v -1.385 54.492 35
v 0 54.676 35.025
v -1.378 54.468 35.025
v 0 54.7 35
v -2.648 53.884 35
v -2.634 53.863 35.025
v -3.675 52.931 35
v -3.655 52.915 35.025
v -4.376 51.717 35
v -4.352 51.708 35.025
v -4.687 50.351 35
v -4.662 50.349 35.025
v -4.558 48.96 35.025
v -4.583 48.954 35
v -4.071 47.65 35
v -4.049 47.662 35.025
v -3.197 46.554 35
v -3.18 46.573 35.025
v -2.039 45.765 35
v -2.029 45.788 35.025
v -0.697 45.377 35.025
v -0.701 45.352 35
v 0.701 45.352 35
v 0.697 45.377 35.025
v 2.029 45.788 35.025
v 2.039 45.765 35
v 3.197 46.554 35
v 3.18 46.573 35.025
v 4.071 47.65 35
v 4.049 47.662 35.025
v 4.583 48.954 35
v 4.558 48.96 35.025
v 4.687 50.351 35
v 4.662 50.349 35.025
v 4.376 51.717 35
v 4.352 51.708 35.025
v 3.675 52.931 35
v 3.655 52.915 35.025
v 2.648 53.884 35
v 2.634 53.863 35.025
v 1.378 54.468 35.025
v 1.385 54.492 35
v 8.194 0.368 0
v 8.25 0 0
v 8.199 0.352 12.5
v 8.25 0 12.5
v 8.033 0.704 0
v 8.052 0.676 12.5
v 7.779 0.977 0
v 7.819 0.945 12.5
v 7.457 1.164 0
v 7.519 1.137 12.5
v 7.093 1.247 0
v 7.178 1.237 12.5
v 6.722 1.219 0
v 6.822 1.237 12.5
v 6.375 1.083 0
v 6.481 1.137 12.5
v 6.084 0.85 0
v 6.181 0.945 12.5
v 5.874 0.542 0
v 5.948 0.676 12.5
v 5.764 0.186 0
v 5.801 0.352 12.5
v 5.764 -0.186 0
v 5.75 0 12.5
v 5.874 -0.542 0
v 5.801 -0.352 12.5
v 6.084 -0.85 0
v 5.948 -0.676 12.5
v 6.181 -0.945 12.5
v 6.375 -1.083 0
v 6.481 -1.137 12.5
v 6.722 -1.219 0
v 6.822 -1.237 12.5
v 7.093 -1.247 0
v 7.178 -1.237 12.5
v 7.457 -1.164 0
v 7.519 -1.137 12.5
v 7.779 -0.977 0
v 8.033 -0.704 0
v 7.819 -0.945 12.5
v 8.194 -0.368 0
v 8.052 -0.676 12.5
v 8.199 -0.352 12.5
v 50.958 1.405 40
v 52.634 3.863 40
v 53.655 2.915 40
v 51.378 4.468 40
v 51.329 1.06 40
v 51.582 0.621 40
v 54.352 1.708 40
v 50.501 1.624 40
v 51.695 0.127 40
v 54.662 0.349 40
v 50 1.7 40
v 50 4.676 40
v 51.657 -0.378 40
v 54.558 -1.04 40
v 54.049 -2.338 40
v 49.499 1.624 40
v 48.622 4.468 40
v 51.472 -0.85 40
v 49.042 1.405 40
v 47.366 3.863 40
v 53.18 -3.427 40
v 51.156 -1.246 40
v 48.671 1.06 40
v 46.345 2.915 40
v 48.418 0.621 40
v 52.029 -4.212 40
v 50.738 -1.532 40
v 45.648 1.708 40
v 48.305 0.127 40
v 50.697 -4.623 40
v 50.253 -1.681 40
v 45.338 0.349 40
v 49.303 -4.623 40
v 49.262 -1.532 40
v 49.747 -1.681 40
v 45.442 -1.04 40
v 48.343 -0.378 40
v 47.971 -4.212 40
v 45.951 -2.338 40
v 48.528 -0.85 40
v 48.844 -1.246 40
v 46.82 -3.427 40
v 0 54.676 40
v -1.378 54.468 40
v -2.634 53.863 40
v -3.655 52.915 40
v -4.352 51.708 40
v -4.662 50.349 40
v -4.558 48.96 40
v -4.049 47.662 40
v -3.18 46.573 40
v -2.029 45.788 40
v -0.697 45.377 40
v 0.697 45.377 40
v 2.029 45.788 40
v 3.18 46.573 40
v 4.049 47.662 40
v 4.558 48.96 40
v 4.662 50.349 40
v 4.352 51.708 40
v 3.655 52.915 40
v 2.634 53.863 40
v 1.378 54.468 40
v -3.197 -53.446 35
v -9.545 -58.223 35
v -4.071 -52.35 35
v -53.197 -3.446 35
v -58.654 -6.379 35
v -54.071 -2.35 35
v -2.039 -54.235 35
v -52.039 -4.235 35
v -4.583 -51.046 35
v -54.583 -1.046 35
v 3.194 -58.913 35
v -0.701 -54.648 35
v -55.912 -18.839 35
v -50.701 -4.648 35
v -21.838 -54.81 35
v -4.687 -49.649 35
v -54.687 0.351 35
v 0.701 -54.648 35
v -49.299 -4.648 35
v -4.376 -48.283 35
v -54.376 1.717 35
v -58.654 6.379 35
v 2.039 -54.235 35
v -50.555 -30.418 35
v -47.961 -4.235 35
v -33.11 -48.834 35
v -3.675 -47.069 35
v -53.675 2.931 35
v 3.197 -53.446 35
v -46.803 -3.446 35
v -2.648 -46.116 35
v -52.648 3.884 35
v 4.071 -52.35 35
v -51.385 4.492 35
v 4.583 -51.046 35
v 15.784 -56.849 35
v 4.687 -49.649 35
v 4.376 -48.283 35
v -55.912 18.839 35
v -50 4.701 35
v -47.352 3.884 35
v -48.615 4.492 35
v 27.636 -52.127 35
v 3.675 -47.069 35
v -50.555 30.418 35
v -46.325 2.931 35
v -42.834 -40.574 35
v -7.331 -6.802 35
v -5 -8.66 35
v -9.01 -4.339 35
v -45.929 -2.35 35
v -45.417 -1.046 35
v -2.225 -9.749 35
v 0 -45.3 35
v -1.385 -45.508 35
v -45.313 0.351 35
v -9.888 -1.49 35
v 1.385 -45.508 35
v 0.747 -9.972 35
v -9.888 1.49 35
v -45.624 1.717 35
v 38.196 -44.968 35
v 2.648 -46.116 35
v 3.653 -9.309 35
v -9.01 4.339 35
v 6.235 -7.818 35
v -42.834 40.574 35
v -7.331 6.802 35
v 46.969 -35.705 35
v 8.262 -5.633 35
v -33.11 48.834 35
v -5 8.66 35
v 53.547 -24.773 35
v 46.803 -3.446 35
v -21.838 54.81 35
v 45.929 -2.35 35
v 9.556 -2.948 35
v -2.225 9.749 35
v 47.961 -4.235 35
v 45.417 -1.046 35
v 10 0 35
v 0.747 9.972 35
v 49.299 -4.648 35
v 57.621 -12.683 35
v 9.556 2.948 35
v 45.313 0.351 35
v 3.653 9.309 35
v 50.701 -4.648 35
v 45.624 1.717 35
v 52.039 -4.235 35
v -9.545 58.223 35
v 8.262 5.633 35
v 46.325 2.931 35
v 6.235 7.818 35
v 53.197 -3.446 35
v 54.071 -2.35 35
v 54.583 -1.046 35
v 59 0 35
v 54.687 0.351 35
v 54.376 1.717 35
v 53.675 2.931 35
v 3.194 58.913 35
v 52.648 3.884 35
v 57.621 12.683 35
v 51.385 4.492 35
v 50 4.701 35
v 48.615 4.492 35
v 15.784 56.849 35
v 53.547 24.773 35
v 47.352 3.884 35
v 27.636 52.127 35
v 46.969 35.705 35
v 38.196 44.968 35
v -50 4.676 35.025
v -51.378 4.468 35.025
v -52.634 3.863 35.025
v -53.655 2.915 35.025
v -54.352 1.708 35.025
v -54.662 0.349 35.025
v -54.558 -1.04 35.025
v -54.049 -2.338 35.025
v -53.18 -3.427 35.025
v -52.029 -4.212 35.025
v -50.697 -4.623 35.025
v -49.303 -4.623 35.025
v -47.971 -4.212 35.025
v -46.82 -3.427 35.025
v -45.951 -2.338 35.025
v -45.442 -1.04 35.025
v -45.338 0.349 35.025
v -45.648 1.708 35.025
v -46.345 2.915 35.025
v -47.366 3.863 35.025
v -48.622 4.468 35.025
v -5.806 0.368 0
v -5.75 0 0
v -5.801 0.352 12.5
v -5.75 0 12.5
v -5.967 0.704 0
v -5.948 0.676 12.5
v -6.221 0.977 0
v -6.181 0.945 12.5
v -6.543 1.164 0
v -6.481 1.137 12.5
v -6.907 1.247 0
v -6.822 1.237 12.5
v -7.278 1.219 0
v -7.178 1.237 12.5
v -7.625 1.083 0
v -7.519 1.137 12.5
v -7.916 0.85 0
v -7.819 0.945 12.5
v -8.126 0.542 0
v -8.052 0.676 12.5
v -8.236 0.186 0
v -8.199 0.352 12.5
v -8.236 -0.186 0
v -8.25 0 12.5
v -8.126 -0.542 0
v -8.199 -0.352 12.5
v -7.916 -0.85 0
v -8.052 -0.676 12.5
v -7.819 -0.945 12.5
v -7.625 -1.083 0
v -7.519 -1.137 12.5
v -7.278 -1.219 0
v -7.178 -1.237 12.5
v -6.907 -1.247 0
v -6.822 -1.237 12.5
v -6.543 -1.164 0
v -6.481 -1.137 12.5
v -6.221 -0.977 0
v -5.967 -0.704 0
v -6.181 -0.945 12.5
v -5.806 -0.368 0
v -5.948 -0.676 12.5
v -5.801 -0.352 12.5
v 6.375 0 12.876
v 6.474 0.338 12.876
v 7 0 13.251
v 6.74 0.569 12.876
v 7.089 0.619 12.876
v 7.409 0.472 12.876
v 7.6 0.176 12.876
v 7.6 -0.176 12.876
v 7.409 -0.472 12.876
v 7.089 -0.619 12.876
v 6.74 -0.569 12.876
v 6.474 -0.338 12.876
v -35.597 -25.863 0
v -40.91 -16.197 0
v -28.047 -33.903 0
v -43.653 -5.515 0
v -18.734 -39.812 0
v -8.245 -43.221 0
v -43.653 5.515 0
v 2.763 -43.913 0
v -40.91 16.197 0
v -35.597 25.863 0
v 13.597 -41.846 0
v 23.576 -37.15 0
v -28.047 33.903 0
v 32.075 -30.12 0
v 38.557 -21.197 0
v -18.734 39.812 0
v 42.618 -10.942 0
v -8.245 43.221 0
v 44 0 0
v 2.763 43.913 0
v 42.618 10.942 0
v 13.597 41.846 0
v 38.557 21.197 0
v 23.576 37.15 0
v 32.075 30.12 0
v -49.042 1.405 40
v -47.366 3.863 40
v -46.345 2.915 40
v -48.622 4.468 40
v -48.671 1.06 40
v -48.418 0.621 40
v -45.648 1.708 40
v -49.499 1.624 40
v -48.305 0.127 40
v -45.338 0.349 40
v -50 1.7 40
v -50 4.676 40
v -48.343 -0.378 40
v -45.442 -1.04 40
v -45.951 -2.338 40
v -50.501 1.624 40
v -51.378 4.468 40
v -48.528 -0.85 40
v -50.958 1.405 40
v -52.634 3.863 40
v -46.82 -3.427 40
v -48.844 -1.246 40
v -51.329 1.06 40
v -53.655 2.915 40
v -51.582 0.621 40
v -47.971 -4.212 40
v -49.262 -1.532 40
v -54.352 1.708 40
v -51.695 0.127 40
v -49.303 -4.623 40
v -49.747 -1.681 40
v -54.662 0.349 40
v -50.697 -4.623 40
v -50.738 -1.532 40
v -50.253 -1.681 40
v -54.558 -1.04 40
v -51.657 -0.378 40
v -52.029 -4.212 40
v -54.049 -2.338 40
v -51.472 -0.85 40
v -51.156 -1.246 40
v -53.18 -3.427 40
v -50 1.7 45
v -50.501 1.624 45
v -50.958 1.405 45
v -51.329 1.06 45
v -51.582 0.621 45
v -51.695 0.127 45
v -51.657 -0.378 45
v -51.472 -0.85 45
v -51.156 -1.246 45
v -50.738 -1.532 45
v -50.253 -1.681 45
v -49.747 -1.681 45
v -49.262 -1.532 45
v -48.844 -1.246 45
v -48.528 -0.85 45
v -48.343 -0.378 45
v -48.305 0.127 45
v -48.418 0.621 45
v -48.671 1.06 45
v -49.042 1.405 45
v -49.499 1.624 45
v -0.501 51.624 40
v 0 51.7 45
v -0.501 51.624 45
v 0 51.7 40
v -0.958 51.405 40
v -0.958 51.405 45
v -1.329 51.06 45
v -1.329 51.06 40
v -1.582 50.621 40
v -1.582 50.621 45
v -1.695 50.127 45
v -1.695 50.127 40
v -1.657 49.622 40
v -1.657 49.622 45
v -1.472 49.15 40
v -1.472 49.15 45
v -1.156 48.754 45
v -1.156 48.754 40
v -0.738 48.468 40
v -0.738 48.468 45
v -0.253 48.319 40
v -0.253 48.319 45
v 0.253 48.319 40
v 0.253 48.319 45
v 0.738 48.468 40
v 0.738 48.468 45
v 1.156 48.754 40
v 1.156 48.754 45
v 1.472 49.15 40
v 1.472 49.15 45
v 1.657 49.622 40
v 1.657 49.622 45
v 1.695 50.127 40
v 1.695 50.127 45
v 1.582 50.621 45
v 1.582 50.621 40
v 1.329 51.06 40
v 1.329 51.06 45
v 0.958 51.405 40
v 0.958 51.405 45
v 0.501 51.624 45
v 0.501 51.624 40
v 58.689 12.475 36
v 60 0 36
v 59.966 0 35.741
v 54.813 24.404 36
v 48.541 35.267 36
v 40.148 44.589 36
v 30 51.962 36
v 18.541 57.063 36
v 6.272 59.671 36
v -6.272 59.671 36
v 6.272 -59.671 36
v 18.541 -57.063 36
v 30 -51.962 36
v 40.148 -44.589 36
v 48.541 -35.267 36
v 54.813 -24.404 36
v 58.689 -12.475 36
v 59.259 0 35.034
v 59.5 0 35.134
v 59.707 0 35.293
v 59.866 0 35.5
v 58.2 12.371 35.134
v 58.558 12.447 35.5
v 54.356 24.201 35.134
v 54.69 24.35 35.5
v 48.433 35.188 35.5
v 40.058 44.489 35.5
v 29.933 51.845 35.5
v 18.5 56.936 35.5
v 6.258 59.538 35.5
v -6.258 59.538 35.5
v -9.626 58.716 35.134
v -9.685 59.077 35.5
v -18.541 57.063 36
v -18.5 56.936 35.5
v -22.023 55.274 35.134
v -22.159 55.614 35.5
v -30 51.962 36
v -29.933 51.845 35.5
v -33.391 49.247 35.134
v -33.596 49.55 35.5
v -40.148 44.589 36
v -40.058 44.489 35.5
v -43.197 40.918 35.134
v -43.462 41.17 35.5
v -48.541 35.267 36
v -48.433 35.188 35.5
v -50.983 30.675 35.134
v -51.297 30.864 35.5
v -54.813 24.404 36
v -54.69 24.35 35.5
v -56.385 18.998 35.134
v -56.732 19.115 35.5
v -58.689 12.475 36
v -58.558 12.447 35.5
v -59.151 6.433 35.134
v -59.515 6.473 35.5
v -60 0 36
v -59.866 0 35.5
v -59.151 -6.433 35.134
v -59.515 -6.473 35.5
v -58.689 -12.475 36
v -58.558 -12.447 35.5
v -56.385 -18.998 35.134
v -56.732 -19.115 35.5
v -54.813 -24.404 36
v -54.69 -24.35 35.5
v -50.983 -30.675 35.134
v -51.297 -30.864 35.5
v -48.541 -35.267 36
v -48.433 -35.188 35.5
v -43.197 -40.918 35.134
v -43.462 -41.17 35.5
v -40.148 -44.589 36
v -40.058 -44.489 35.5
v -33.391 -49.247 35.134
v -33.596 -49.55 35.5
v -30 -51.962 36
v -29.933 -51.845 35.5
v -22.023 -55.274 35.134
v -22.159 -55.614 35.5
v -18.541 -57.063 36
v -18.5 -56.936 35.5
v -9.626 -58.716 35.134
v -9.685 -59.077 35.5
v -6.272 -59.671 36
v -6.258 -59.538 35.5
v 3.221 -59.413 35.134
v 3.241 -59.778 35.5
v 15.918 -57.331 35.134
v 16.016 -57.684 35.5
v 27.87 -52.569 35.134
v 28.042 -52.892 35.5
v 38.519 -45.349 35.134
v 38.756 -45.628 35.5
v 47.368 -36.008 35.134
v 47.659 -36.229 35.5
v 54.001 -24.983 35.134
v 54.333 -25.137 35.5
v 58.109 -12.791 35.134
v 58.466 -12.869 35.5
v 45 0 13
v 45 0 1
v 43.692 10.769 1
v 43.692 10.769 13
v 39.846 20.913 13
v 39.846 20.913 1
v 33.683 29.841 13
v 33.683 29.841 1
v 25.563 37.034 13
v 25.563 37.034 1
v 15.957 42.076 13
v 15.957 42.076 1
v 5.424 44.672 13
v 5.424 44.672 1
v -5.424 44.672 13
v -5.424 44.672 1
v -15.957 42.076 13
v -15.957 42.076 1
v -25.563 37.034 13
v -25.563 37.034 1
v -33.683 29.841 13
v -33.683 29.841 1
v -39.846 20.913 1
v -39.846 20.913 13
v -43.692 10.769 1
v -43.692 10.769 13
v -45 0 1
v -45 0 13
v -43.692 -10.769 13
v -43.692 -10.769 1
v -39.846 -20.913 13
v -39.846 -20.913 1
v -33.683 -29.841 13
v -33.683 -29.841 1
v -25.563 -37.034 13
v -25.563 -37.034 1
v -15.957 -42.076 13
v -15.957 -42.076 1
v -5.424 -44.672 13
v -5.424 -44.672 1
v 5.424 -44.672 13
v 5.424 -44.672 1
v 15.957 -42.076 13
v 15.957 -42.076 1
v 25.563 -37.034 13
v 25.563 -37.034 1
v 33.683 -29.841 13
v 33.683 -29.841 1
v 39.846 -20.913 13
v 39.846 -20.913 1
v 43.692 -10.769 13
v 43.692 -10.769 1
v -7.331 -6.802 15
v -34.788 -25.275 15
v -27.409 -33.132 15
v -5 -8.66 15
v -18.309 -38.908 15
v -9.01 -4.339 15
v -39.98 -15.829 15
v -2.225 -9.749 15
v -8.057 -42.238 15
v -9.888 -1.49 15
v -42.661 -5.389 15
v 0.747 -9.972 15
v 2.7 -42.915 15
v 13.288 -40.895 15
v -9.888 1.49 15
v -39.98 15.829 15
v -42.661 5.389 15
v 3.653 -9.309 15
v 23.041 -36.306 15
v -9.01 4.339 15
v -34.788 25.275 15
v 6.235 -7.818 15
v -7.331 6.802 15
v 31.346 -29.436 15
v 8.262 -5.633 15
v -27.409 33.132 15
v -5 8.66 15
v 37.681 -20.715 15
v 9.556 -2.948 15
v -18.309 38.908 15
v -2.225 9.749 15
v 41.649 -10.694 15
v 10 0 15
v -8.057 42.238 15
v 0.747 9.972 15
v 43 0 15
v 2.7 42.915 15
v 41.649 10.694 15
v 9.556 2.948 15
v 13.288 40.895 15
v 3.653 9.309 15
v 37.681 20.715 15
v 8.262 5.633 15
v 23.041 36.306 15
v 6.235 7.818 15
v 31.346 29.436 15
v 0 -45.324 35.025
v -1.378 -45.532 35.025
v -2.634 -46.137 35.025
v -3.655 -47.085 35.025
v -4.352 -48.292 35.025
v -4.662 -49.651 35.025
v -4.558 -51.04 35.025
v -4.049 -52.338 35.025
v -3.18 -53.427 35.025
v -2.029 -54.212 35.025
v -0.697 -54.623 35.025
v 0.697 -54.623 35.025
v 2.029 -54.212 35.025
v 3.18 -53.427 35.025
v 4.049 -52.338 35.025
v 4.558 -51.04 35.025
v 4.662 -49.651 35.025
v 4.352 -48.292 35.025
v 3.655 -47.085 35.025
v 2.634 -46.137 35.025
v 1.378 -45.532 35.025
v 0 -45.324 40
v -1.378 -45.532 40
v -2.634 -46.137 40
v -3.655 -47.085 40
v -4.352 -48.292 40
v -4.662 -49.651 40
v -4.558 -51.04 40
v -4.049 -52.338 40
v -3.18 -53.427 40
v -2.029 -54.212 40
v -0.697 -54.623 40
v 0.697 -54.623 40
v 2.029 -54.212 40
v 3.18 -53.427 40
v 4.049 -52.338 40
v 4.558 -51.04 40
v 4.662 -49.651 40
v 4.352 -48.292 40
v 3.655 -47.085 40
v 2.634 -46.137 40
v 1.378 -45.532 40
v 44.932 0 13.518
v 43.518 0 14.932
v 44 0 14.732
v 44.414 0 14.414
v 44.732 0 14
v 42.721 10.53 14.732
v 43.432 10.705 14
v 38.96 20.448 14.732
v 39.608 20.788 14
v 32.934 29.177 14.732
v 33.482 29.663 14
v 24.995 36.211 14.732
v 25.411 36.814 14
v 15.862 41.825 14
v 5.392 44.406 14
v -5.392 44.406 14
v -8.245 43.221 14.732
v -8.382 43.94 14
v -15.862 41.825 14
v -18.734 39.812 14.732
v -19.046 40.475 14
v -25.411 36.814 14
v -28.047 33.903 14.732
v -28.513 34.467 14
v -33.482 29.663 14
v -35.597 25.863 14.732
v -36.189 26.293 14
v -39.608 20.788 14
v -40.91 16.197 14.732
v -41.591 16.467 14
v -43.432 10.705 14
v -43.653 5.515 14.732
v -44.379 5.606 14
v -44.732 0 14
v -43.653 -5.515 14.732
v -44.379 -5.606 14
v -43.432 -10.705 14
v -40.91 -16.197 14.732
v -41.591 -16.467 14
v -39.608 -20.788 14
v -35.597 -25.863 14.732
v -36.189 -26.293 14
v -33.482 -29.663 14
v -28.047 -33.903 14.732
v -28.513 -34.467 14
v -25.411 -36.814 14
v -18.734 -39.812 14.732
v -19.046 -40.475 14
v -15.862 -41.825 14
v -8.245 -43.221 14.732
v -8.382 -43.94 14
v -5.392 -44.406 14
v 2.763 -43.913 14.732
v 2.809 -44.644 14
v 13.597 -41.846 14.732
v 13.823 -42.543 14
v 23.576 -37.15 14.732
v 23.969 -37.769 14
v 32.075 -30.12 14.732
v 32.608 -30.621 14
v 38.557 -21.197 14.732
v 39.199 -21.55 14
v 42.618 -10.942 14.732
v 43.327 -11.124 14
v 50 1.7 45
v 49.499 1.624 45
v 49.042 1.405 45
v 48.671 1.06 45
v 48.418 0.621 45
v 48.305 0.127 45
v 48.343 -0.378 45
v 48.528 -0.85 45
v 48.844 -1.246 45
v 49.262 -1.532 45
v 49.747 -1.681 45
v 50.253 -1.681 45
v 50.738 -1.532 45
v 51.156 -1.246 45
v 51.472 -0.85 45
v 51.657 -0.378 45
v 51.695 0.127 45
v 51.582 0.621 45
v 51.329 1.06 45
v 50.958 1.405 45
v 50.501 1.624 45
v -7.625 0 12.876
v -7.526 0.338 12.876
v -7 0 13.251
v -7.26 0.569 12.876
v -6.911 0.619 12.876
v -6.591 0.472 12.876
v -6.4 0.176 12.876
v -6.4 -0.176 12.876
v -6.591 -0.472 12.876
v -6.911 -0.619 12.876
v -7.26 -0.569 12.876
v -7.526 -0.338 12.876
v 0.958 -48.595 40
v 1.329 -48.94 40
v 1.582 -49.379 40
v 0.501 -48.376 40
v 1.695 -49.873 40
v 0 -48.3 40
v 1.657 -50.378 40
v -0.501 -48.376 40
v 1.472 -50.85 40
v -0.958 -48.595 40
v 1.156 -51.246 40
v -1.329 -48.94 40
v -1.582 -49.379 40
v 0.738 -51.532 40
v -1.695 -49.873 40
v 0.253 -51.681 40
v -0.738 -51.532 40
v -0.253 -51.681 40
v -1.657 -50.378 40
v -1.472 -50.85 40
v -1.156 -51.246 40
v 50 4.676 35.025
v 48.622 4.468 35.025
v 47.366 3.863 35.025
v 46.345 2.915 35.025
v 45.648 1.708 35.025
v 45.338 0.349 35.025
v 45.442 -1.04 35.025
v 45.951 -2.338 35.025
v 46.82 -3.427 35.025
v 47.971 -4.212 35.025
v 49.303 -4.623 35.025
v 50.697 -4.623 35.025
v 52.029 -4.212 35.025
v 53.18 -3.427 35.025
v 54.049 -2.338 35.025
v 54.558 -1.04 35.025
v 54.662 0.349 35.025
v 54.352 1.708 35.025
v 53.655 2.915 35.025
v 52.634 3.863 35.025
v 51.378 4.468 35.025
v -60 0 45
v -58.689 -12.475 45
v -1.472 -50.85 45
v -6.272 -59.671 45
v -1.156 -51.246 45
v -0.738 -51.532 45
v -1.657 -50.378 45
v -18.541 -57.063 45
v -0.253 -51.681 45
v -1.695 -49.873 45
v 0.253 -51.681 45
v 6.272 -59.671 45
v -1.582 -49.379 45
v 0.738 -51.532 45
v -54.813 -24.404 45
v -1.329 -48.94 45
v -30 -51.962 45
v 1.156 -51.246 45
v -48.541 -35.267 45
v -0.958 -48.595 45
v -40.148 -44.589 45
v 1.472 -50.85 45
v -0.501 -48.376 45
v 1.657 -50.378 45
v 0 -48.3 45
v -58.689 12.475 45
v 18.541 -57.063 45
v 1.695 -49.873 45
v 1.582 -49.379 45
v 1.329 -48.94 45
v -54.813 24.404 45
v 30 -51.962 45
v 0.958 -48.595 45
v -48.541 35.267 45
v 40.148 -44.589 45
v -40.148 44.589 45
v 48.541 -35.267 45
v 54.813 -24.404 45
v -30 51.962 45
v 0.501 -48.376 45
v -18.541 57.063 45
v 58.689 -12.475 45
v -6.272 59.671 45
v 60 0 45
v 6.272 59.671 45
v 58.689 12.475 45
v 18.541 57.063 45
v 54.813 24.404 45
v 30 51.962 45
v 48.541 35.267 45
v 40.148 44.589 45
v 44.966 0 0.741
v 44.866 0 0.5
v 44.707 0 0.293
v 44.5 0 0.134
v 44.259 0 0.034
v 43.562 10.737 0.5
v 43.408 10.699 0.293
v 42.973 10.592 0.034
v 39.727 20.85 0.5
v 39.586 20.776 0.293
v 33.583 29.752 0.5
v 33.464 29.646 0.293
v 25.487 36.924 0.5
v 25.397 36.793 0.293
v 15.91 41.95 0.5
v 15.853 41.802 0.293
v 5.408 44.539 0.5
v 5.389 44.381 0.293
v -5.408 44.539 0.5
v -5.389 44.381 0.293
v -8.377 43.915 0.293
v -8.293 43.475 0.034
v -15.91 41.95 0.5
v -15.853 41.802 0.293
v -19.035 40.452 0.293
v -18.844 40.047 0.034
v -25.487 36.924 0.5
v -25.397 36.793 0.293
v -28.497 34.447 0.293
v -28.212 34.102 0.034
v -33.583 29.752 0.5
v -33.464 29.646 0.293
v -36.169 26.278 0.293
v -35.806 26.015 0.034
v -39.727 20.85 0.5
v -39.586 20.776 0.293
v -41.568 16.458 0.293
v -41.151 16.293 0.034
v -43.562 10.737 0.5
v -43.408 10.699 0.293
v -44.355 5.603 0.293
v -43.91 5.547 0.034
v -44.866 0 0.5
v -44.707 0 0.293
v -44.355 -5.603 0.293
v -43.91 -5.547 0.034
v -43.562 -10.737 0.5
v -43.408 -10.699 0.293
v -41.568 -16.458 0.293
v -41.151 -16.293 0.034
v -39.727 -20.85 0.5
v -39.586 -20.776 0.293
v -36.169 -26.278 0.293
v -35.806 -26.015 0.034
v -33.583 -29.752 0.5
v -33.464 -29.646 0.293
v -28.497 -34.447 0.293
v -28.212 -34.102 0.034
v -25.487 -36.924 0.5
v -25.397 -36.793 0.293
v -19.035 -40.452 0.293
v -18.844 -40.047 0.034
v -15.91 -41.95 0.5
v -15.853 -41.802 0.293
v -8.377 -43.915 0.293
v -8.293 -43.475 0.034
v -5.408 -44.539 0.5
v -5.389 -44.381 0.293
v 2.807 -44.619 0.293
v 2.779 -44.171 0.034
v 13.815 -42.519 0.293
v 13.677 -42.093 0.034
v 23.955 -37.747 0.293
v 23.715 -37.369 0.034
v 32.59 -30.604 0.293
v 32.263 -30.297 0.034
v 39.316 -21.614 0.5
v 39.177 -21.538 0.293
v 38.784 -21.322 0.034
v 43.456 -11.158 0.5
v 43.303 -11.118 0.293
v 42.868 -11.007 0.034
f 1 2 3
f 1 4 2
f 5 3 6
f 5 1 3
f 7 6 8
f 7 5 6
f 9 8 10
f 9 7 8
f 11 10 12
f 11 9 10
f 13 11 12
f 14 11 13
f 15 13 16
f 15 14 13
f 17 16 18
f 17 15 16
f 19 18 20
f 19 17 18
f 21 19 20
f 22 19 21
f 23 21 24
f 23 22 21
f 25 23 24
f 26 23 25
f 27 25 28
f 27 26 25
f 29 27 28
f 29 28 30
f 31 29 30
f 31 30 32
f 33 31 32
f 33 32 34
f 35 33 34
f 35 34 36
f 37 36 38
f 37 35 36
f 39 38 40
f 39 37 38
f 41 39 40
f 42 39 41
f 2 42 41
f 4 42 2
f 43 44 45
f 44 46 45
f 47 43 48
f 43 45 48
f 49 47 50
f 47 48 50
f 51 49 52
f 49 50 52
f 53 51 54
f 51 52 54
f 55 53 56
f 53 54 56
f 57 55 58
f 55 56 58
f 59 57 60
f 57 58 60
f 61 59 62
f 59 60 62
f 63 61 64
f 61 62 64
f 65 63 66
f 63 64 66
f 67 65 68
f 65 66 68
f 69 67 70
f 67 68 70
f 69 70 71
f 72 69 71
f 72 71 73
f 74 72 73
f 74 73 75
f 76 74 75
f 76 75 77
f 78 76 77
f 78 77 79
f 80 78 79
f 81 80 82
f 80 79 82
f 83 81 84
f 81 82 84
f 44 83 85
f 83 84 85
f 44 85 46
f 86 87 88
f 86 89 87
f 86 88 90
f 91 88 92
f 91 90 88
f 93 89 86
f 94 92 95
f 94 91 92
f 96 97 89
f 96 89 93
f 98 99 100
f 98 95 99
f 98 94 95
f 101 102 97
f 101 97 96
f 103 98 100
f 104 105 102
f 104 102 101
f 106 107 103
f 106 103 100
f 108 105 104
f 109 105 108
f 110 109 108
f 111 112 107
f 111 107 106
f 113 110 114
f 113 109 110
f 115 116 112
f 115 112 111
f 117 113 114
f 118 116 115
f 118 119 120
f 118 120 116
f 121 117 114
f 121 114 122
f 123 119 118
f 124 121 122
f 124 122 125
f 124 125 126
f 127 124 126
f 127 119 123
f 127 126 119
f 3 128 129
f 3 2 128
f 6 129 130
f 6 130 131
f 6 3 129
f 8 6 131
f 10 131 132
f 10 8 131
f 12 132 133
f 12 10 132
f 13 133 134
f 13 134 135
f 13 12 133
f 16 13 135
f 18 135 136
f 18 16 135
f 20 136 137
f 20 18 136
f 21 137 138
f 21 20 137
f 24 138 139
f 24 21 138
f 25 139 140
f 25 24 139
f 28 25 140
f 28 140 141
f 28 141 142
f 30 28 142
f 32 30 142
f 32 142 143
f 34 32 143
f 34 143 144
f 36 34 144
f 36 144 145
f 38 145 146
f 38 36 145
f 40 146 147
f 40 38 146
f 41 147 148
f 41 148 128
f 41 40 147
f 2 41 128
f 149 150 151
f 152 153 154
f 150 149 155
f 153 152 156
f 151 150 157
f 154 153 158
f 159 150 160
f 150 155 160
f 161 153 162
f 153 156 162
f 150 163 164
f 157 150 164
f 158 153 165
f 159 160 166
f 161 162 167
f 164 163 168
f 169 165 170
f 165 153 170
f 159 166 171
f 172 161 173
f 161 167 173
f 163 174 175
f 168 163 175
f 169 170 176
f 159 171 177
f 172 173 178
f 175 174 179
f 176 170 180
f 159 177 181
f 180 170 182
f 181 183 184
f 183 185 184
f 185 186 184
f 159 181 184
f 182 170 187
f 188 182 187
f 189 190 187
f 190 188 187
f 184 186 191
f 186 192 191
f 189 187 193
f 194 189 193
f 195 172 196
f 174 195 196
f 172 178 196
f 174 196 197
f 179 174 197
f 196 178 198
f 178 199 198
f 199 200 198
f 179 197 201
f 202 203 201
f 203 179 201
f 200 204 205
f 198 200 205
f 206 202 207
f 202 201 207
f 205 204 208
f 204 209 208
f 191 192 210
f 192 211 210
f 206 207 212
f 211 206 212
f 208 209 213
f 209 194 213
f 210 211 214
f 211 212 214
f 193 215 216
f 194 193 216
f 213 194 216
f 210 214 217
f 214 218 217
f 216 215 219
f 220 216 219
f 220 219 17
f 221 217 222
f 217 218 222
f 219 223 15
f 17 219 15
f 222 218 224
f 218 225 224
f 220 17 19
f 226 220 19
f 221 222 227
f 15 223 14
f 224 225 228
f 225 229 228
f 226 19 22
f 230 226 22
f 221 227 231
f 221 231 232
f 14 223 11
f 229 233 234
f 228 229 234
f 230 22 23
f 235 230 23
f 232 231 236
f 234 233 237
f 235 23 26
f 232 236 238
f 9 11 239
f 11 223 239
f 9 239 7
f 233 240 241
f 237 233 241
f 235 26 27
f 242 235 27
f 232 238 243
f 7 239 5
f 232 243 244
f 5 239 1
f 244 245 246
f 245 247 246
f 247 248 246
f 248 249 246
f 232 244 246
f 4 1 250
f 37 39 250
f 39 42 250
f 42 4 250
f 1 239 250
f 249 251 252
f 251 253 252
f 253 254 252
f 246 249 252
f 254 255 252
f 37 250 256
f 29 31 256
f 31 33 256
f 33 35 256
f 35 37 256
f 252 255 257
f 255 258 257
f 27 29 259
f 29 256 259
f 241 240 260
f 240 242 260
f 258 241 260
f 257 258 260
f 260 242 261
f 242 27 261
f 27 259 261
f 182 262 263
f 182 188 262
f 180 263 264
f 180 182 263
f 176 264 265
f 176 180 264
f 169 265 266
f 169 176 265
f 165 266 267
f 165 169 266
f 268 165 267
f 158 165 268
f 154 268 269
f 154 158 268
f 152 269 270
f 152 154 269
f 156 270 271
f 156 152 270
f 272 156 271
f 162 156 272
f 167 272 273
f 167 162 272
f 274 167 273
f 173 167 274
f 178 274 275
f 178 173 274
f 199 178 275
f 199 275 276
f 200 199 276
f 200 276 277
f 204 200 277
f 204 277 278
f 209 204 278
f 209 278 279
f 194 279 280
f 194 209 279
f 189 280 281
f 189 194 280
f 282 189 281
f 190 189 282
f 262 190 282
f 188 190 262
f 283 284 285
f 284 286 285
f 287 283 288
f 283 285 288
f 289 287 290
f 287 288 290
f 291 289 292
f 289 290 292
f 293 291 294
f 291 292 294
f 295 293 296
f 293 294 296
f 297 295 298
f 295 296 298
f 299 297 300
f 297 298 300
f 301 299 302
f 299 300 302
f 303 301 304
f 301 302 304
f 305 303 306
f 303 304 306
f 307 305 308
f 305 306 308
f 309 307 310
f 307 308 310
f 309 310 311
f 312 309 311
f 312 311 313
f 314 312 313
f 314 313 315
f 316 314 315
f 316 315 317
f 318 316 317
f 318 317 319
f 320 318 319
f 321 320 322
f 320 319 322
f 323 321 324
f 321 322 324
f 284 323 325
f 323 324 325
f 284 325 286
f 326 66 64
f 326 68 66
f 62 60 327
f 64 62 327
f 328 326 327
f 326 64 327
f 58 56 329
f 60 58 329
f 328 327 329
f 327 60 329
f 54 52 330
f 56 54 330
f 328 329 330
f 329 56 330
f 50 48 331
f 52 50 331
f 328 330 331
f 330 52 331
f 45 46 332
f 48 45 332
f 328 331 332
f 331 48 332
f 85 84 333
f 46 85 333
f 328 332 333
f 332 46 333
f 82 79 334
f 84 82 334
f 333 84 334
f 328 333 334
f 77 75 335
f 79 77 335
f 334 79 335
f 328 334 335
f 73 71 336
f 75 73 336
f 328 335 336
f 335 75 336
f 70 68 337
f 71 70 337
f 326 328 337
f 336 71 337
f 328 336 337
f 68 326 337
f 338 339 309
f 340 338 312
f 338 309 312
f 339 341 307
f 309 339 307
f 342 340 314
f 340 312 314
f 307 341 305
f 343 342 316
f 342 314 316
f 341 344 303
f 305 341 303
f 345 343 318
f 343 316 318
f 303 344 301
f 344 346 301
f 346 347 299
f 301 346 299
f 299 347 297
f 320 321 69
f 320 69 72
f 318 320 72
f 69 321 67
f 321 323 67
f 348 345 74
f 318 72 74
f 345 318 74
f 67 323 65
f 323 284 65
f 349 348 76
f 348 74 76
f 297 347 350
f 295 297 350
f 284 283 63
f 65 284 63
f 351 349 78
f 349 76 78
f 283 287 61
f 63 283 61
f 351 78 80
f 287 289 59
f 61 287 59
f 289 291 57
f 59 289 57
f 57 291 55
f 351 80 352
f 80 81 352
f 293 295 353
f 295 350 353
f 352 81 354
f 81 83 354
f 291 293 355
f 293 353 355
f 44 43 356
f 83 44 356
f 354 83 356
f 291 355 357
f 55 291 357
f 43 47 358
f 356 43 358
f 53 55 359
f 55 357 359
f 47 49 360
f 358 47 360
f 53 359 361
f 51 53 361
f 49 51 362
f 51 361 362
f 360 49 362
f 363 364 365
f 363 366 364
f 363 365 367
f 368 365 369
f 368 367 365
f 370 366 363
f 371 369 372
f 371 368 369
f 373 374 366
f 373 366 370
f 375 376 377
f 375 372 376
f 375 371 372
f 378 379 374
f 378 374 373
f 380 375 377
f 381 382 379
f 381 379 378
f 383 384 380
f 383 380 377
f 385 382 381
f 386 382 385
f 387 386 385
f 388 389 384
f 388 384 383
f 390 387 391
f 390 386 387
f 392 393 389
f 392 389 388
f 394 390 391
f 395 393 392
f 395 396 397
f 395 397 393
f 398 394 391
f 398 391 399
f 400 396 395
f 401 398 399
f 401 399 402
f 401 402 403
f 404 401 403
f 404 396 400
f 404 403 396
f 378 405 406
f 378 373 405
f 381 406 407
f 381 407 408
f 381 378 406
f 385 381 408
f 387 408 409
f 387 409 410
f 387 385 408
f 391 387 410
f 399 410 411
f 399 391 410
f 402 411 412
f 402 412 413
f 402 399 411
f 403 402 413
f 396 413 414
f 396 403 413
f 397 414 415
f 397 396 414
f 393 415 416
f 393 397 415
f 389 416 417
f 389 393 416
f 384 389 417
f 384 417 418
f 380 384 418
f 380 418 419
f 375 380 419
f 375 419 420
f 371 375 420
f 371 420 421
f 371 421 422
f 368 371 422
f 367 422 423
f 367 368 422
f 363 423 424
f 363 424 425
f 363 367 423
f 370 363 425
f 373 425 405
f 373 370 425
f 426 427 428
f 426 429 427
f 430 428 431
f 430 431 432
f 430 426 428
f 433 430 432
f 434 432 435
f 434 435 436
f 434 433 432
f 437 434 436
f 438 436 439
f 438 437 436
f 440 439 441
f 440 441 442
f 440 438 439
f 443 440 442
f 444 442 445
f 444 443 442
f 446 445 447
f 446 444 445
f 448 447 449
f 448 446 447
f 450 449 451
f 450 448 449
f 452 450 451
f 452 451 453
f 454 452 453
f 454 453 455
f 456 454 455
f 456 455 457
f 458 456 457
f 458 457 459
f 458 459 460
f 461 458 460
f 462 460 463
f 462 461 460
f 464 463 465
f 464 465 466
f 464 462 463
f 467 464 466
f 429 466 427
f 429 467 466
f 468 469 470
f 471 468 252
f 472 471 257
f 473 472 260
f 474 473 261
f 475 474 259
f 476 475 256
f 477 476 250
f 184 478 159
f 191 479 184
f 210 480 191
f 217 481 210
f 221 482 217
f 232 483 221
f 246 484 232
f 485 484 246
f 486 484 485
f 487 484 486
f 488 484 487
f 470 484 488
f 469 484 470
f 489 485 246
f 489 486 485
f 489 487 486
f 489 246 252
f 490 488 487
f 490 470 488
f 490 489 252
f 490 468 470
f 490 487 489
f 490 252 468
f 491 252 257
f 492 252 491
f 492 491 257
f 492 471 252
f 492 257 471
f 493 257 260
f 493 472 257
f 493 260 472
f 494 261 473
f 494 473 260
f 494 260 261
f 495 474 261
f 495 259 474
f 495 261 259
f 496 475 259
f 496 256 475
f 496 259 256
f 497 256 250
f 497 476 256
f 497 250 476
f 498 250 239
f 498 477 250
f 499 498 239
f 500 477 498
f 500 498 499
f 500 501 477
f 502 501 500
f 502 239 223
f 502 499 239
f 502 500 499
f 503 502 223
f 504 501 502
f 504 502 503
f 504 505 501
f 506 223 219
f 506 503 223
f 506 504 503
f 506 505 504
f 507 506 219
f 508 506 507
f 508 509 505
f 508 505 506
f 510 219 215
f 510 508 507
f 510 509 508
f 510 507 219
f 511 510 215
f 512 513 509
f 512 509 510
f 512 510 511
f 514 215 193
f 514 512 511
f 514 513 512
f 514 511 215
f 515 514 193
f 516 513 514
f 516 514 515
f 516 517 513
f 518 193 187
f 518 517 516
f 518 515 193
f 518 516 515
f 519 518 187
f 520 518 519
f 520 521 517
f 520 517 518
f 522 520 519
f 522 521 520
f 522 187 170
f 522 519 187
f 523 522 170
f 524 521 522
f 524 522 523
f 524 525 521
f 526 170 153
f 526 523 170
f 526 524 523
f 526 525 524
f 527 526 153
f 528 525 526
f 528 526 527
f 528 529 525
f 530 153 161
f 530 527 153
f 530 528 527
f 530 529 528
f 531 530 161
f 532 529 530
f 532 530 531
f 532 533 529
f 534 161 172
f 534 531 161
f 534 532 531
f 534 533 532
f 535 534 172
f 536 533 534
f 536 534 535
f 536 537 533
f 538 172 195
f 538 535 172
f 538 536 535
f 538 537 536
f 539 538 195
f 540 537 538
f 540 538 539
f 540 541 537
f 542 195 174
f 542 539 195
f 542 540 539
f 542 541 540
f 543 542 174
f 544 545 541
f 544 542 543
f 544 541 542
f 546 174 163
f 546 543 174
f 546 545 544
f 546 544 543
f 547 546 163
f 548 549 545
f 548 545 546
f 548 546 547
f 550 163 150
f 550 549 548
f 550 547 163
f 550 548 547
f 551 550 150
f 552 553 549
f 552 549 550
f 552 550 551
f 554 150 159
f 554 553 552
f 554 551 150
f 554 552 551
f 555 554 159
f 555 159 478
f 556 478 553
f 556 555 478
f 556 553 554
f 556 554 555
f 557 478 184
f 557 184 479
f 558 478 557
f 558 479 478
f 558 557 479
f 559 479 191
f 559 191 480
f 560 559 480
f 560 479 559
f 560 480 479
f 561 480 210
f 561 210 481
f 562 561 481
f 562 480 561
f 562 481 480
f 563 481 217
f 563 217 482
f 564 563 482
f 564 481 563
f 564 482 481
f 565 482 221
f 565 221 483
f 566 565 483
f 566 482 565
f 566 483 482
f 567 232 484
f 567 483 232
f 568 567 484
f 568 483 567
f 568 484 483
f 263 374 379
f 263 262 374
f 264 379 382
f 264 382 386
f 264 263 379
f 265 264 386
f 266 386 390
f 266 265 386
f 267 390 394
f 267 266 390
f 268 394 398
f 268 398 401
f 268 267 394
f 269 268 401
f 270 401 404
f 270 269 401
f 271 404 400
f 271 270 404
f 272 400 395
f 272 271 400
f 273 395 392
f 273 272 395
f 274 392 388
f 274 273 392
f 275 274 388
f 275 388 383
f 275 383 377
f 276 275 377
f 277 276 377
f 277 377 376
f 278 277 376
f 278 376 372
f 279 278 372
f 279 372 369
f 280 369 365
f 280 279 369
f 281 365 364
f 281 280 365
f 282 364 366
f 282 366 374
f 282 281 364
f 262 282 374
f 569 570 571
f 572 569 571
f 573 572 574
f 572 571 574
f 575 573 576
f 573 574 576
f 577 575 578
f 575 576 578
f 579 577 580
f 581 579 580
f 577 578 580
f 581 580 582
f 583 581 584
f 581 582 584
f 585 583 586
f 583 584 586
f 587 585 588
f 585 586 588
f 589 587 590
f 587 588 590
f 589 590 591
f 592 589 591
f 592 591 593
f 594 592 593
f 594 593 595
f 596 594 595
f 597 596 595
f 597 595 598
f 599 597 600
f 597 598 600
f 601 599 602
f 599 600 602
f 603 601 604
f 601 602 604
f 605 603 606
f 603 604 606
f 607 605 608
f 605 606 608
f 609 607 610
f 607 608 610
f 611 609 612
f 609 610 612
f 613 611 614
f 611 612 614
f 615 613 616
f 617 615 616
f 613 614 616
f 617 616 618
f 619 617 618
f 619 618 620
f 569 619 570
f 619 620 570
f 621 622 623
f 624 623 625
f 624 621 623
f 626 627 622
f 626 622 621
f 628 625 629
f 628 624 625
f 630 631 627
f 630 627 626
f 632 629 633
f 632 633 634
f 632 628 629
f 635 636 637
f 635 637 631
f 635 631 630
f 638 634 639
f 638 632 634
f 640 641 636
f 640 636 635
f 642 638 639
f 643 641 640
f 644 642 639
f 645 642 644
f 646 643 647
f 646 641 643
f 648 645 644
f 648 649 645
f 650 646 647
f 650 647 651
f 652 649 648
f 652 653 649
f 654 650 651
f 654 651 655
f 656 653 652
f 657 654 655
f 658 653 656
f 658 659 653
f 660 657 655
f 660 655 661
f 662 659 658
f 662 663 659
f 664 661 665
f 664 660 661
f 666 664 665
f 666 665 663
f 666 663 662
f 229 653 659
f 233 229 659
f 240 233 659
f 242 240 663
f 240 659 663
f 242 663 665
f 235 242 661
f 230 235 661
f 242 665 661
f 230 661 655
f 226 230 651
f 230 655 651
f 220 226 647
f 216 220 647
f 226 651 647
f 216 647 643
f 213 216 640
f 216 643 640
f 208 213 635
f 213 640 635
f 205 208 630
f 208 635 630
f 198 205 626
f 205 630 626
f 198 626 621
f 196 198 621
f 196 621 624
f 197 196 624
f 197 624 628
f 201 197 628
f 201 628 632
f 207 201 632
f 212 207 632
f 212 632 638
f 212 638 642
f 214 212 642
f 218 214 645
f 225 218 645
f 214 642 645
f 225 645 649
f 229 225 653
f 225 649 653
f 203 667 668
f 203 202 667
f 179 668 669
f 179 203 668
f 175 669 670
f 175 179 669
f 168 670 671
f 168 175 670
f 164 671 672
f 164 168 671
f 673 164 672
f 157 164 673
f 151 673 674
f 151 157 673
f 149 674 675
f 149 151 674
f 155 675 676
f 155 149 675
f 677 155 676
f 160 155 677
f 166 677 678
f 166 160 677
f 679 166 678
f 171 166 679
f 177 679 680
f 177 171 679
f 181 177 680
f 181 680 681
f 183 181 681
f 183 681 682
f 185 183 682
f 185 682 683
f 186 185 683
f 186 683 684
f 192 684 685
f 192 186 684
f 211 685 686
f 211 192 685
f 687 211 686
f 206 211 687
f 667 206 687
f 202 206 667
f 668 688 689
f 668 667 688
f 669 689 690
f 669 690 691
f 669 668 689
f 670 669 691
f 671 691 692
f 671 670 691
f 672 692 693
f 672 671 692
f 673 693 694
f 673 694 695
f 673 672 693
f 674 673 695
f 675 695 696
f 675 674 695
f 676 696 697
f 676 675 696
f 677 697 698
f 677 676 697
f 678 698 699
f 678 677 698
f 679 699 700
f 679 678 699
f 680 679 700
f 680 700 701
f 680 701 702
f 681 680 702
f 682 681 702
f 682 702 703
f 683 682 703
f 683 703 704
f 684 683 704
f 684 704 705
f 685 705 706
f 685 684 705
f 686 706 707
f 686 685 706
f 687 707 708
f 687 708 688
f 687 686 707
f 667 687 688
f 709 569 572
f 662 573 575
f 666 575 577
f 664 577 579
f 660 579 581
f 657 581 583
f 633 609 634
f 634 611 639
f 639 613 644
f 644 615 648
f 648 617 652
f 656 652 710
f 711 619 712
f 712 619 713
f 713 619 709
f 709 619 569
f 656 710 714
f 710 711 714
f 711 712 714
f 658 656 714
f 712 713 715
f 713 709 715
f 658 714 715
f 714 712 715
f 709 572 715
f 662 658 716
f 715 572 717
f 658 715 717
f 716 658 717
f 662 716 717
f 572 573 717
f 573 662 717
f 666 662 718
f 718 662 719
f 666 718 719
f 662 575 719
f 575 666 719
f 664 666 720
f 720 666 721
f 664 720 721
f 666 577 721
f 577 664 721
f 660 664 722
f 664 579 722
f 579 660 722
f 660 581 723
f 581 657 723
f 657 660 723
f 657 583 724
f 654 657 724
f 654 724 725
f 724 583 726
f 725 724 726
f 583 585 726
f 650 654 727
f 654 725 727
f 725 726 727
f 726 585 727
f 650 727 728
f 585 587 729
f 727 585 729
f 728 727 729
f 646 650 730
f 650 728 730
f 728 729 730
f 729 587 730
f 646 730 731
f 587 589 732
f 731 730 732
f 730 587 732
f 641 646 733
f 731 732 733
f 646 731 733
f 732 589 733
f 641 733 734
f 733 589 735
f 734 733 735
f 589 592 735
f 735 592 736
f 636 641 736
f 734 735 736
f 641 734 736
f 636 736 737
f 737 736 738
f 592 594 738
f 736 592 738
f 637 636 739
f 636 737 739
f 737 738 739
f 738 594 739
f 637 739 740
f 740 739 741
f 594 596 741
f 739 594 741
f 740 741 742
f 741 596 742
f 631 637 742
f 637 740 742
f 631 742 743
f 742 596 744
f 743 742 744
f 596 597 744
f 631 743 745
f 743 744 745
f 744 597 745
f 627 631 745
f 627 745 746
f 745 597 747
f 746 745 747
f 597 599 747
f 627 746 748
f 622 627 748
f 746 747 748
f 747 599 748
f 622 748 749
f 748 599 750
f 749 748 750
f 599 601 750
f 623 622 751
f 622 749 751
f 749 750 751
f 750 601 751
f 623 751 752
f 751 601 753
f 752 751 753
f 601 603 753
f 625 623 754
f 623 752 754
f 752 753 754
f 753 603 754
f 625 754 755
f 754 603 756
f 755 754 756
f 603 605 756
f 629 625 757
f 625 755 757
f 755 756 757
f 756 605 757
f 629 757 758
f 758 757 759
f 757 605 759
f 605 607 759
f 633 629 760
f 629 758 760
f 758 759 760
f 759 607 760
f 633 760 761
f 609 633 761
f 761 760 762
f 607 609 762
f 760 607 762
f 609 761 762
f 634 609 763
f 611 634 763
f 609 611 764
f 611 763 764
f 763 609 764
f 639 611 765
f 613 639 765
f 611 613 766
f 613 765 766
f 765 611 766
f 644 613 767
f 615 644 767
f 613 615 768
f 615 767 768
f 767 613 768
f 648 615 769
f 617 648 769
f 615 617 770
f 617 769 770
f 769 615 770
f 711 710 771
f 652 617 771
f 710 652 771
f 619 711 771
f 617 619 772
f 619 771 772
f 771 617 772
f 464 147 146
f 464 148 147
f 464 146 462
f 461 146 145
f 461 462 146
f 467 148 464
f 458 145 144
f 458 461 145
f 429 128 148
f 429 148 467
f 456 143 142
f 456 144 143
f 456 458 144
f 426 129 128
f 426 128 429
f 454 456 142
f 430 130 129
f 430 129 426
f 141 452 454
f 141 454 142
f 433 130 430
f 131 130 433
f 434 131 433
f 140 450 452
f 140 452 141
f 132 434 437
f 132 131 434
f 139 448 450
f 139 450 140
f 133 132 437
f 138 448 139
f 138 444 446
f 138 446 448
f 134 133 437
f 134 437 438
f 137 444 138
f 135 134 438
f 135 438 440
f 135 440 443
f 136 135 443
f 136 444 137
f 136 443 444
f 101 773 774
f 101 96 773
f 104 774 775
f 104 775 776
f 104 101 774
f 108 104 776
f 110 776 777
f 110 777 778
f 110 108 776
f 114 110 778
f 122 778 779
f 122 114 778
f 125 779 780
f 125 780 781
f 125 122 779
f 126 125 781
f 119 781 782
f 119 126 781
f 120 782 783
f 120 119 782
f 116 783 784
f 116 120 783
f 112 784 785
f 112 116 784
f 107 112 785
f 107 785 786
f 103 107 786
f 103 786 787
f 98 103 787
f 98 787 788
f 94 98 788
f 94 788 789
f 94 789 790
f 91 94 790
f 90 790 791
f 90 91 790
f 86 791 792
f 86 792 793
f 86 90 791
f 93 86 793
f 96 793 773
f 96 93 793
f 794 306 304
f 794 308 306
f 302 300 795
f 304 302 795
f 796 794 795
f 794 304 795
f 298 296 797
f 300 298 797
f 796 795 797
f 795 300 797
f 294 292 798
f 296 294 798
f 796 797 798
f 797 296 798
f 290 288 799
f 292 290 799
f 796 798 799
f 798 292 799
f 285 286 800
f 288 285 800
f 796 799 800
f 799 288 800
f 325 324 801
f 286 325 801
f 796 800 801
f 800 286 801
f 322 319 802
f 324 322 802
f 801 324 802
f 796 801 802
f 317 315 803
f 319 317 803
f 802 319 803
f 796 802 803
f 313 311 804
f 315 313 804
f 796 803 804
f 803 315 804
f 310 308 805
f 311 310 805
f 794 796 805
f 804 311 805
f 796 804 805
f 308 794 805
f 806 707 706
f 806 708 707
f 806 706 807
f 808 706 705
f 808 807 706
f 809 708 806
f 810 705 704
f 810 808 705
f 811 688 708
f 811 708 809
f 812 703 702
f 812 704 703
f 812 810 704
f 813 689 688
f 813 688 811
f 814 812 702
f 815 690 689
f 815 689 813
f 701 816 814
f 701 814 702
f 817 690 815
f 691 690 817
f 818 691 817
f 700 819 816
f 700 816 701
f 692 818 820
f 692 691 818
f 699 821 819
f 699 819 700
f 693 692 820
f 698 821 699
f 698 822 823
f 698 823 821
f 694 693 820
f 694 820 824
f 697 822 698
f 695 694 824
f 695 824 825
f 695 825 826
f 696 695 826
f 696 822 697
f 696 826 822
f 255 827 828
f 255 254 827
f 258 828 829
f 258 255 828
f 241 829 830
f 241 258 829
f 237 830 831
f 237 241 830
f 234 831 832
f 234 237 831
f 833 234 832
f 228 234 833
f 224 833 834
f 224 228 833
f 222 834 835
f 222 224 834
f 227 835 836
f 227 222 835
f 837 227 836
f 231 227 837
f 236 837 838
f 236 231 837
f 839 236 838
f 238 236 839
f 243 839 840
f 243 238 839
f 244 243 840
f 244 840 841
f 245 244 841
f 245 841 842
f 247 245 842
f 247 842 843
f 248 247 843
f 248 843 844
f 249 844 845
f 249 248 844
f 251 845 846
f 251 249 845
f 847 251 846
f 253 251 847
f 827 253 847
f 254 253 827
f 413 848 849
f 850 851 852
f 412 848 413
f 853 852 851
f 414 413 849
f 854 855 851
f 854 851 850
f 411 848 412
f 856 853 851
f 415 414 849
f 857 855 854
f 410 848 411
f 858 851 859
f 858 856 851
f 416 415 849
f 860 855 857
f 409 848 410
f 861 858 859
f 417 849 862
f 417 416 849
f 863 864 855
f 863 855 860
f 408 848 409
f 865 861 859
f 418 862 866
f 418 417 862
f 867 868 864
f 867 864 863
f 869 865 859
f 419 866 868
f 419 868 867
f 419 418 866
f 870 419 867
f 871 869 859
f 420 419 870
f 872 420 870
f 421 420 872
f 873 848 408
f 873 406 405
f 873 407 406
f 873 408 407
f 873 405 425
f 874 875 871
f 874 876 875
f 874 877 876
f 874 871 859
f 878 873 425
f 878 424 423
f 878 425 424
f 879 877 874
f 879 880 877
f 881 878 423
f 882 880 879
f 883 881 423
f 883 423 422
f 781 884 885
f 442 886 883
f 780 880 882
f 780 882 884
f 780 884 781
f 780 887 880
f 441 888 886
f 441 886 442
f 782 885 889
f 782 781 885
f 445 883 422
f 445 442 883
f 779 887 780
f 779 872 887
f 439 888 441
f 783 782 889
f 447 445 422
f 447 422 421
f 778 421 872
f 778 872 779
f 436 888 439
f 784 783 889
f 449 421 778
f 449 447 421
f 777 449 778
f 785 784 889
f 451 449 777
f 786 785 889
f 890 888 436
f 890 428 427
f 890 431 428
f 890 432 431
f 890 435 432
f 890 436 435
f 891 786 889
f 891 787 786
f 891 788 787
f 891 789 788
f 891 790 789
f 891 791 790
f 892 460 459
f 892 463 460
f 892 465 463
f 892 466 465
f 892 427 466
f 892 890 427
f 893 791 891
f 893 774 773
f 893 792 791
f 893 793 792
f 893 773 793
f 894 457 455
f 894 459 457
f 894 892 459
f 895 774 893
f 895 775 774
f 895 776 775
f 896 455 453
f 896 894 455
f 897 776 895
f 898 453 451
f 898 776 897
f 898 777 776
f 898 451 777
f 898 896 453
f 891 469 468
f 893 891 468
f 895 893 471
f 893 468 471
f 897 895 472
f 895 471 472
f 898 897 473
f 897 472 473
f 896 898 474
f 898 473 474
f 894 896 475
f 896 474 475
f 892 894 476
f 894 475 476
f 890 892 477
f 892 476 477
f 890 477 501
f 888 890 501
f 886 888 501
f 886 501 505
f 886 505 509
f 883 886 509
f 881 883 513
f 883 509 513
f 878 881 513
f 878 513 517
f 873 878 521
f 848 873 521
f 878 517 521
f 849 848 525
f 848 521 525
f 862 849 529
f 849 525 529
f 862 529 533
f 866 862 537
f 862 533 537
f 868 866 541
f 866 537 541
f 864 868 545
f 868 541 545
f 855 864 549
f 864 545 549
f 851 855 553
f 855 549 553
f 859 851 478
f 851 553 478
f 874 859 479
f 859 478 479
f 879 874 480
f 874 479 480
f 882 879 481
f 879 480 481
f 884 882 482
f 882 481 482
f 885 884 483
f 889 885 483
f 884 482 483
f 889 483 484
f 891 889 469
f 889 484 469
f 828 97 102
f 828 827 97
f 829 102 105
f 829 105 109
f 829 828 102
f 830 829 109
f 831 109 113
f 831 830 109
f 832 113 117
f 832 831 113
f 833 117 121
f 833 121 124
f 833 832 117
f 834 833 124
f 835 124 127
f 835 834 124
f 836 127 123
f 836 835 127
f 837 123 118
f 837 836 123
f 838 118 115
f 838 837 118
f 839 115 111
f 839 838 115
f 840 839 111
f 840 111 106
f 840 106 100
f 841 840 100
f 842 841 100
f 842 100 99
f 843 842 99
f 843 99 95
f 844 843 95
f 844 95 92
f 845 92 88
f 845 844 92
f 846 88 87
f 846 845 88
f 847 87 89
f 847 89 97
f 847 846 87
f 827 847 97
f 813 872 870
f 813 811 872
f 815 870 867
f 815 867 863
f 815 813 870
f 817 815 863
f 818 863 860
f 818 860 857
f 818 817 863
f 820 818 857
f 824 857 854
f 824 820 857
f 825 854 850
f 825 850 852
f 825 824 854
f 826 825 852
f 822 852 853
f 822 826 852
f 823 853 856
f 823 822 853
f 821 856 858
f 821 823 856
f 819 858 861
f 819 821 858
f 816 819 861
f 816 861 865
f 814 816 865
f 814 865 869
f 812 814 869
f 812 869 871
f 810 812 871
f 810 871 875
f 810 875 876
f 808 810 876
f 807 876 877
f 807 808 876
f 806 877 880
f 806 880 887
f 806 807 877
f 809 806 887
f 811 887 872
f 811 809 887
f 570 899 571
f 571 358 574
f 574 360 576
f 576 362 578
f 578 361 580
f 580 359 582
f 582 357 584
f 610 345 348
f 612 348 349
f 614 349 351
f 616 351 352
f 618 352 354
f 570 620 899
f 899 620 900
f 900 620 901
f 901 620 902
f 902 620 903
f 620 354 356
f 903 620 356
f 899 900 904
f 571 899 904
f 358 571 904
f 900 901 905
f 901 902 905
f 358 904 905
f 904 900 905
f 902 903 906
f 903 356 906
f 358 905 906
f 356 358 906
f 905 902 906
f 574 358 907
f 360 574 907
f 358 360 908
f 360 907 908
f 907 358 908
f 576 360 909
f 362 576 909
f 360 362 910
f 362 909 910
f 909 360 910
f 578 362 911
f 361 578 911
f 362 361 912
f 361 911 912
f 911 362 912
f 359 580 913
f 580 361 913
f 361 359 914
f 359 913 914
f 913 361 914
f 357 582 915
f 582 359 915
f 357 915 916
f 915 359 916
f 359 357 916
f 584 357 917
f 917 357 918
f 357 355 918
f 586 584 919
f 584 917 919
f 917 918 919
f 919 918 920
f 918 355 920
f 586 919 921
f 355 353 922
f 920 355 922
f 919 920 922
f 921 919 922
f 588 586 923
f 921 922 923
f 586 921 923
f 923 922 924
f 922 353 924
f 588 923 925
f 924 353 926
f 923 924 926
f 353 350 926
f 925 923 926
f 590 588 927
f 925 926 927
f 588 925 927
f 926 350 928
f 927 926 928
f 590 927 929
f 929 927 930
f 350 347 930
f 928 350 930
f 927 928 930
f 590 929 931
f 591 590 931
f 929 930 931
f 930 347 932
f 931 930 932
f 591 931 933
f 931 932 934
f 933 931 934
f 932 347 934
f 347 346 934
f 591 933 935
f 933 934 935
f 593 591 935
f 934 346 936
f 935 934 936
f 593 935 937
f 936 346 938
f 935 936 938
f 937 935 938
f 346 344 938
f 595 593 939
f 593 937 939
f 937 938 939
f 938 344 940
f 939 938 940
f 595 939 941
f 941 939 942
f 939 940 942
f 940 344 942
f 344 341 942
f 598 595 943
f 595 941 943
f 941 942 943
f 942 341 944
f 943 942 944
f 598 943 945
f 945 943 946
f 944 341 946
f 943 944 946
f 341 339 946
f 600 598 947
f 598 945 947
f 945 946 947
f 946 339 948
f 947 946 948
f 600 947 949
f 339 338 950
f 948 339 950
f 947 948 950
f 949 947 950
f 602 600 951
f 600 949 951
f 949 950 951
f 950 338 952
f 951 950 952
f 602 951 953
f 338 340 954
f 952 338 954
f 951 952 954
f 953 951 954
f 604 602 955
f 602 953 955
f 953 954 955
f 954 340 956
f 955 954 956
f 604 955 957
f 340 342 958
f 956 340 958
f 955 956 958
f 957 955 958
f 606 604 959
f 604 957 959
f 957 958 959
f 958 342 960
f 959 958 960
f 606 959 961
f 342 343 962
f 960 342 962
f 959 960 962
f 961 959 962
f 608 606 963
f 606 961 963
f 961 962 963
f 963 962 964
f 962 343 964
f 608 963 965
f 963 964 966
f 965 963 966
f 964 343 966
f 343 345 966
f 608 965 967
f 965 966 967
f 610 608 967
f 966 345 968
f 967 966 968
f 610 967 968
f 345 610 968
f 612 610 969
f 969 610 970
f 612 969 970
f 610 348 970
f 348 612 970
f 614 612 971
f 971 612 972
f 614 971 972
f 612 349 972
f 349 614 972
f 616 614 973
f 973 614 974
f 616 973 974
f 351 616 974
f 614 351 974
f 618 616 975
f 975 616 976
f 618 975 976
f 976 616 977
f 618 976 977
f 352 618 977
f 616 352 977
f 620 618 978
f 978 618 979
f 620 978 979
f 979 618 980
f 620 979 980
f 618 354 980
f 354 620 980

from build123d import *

# Parameters (mm, degrees)
ESQUISSE1_R                                = 45
BOSS_EXTRU_1_DEPTH                         = 15
ESQUISSE3_R                                = 10
BOSS_EXTRU_2_DEPTH                         = 20
ESQUISSE4_R                                = 60
BOSS_EXTRU_3_DEPTH                         = 10
CONG_1_R                                   = 2
CONG_2_R                                   = 1
CONG_3_R                                   = 1
TROU_TARAUD_M31_D                          = 2.5
TROU_TARAUD_M31_DEPTH                      = 12.5
TROU_TARAUD_M31_TIP                        = 0.751075774
CHAMBRAGE_POUR_VIS_T_TE_HEXAGONALE_2_COUNT = 2
CHAMBRAGE_POUR_VIS_T_TE_HEXAGONALE_2_PITCH = 70.710678119
CHAMBRAGE_POUR_VIS_T_TE_HEXAGONALE_3_COUNT = 2
CHAMBRAGE_POUR_VIS_T_TE_HEXAGONALE_3_PITCH = 100
CHAMBRAGE_POUR_VIS_T_TE_HEXAGONALE_4_COUNT = 2
CHAMBRAGE_POUR_VIS_T_TE_HEXAGONALE_4_PITCH = 70.710678119


with BuildPart() as part:
    # Esquisse1 → Boss.-Extru.1 (new body)
    with BuildSketch(Plane.XY):
        Circle(ESQUISSE1_R)
    extrude(amount=BOSS_EXTRU_1_DEPTH)

    # Esquisse3 → Boss.-Extru.2 (add)
    with BuildSketch(Plane.XY.offset(15)):
        Circle(ESQUISSE3_R)
    extrude(amount=BOSS_EXTRU_2_DEPTH)

    # Esquisse4 → Boss.-Extru.3 (add)
    with BuildSketch(Plane.XY.offset(35)):
        Circle(ESQUISSE4_R)
    extrude(amount=BOSS_EXTRU_3_DEPTH)

    # Congé1
    cong_1_edges = [part.edges().sort_by_distance(p)[0] for p in [
        (-45, 0, 15),
    ]]
    fillet(cong_1_edges, radius=CONG_1_R)

    # Congé2
    cong_2_edges = [part.edges().sort_by_distance(p)[0] for p in [
        (-60, 0, 35),
    ]]
    fillet(cong_2_edges, radius=CONG_2_R)

    # Congé3
    cong_3_edges = [part.edges().sort_by_distance(p)[0] for p in [
        (-45, 0, 0),
    ]]
    fillet(cong_3_edges, radius=CONG_3_R)

    # Trou taraudé M31
    with Locations(Plane(origin=(-7, 0, 0), x_dir=(-1, 0, 0), z_dir=(0, 0, -1))):
        with Locations((0, 0), (-14, 0)):
            Hole(TROU_TARAUD_M31_D / 2, depth=TROU_TARAUD_M31_DEPTH)
            with Locations((0, 0, -(TROU_TARAUD_M31_DEPTH + TROU_TARAUD_M31_TIP / 2))):  # 118° drill point
                Cone(0, TROU_TARAUD_M31_D / 2, TROU_TARAUD_M31_TIP, mode=Mode.SUBTRACT)

    # Esquisse9 → Chambrage pour vis à tête hexagonale M31 (revolve, cut)
    with BuildSketch(Plane(origin=(0, 50, 35), x_dir=(0, 1, 0), z_dir=(1, 0, 0))):
        Polygon((0, 0), (0, 10), (1.7, 10), (1.7, 5), (4.6755, 5), (4.6755, 0.025), (4.7005, 0), align=None)
    chambrage_pour_vis_t_te_hexagonale_m31 = revolve(axis=Axis((0, 50, 28.65), (0, 0, 1)), mode=Mode.SUBTRACT)

    # Chambrage pour vis _ t_te hexagonale 2: Chambrage pour vis à tête hexagonale M31 ×2
    with Locations(*[Vector(0.707106781, -0.707106781, 0) * (i * CHAMBRAGE_POUR_VIS_T_TE_HEXAGONALE_2_PITCH) for i in range(1, CHAMBRAGE_POUR_VIS_T_TE_HEXAGONALE_2_COUNT)]):
        add(chambrage_pour_vis_t_te_hexagonale_m31, mode=Mode.SUBTRACT)

    # Chambrage pour vis _ t_te hexagonale 3: Chambrage pour vis à tête hexagonale M31 ×2
    with Locations(*[(0, -i * CHAMBRAGE_POUR_VIS_T_TE_HEXAGONALE_3_PITCH, 0) for i in range(1, CHAMBRAGE_POUR_VIS_T_TE_HEXAGONALE_3_COUNT)]):
        add(chambrage_pour_vis_t_te_hexagonale_m31, mode=Mode.SUBTRACT)

    # Chambrage pour vis _ t_te hexagonale 4: Chambrage pour vis à tête hexagonale M31 ×2
    with Locations(*[Vector(-0.707106781, -0.707106781, 0) * (i * CHAMBRAGE_POUR_VIS_T_TE_HEXAGONALE_4_PITCH) for i in range(1, CHAMBRAGE_POUR_VIS_T_TE_HEXAGONALE_4_COUNT)]):
        add(chambrage_pour_vis_t_te_hexagonale_m31, mode=Mode.SUBTRACT)


solid = part.part
